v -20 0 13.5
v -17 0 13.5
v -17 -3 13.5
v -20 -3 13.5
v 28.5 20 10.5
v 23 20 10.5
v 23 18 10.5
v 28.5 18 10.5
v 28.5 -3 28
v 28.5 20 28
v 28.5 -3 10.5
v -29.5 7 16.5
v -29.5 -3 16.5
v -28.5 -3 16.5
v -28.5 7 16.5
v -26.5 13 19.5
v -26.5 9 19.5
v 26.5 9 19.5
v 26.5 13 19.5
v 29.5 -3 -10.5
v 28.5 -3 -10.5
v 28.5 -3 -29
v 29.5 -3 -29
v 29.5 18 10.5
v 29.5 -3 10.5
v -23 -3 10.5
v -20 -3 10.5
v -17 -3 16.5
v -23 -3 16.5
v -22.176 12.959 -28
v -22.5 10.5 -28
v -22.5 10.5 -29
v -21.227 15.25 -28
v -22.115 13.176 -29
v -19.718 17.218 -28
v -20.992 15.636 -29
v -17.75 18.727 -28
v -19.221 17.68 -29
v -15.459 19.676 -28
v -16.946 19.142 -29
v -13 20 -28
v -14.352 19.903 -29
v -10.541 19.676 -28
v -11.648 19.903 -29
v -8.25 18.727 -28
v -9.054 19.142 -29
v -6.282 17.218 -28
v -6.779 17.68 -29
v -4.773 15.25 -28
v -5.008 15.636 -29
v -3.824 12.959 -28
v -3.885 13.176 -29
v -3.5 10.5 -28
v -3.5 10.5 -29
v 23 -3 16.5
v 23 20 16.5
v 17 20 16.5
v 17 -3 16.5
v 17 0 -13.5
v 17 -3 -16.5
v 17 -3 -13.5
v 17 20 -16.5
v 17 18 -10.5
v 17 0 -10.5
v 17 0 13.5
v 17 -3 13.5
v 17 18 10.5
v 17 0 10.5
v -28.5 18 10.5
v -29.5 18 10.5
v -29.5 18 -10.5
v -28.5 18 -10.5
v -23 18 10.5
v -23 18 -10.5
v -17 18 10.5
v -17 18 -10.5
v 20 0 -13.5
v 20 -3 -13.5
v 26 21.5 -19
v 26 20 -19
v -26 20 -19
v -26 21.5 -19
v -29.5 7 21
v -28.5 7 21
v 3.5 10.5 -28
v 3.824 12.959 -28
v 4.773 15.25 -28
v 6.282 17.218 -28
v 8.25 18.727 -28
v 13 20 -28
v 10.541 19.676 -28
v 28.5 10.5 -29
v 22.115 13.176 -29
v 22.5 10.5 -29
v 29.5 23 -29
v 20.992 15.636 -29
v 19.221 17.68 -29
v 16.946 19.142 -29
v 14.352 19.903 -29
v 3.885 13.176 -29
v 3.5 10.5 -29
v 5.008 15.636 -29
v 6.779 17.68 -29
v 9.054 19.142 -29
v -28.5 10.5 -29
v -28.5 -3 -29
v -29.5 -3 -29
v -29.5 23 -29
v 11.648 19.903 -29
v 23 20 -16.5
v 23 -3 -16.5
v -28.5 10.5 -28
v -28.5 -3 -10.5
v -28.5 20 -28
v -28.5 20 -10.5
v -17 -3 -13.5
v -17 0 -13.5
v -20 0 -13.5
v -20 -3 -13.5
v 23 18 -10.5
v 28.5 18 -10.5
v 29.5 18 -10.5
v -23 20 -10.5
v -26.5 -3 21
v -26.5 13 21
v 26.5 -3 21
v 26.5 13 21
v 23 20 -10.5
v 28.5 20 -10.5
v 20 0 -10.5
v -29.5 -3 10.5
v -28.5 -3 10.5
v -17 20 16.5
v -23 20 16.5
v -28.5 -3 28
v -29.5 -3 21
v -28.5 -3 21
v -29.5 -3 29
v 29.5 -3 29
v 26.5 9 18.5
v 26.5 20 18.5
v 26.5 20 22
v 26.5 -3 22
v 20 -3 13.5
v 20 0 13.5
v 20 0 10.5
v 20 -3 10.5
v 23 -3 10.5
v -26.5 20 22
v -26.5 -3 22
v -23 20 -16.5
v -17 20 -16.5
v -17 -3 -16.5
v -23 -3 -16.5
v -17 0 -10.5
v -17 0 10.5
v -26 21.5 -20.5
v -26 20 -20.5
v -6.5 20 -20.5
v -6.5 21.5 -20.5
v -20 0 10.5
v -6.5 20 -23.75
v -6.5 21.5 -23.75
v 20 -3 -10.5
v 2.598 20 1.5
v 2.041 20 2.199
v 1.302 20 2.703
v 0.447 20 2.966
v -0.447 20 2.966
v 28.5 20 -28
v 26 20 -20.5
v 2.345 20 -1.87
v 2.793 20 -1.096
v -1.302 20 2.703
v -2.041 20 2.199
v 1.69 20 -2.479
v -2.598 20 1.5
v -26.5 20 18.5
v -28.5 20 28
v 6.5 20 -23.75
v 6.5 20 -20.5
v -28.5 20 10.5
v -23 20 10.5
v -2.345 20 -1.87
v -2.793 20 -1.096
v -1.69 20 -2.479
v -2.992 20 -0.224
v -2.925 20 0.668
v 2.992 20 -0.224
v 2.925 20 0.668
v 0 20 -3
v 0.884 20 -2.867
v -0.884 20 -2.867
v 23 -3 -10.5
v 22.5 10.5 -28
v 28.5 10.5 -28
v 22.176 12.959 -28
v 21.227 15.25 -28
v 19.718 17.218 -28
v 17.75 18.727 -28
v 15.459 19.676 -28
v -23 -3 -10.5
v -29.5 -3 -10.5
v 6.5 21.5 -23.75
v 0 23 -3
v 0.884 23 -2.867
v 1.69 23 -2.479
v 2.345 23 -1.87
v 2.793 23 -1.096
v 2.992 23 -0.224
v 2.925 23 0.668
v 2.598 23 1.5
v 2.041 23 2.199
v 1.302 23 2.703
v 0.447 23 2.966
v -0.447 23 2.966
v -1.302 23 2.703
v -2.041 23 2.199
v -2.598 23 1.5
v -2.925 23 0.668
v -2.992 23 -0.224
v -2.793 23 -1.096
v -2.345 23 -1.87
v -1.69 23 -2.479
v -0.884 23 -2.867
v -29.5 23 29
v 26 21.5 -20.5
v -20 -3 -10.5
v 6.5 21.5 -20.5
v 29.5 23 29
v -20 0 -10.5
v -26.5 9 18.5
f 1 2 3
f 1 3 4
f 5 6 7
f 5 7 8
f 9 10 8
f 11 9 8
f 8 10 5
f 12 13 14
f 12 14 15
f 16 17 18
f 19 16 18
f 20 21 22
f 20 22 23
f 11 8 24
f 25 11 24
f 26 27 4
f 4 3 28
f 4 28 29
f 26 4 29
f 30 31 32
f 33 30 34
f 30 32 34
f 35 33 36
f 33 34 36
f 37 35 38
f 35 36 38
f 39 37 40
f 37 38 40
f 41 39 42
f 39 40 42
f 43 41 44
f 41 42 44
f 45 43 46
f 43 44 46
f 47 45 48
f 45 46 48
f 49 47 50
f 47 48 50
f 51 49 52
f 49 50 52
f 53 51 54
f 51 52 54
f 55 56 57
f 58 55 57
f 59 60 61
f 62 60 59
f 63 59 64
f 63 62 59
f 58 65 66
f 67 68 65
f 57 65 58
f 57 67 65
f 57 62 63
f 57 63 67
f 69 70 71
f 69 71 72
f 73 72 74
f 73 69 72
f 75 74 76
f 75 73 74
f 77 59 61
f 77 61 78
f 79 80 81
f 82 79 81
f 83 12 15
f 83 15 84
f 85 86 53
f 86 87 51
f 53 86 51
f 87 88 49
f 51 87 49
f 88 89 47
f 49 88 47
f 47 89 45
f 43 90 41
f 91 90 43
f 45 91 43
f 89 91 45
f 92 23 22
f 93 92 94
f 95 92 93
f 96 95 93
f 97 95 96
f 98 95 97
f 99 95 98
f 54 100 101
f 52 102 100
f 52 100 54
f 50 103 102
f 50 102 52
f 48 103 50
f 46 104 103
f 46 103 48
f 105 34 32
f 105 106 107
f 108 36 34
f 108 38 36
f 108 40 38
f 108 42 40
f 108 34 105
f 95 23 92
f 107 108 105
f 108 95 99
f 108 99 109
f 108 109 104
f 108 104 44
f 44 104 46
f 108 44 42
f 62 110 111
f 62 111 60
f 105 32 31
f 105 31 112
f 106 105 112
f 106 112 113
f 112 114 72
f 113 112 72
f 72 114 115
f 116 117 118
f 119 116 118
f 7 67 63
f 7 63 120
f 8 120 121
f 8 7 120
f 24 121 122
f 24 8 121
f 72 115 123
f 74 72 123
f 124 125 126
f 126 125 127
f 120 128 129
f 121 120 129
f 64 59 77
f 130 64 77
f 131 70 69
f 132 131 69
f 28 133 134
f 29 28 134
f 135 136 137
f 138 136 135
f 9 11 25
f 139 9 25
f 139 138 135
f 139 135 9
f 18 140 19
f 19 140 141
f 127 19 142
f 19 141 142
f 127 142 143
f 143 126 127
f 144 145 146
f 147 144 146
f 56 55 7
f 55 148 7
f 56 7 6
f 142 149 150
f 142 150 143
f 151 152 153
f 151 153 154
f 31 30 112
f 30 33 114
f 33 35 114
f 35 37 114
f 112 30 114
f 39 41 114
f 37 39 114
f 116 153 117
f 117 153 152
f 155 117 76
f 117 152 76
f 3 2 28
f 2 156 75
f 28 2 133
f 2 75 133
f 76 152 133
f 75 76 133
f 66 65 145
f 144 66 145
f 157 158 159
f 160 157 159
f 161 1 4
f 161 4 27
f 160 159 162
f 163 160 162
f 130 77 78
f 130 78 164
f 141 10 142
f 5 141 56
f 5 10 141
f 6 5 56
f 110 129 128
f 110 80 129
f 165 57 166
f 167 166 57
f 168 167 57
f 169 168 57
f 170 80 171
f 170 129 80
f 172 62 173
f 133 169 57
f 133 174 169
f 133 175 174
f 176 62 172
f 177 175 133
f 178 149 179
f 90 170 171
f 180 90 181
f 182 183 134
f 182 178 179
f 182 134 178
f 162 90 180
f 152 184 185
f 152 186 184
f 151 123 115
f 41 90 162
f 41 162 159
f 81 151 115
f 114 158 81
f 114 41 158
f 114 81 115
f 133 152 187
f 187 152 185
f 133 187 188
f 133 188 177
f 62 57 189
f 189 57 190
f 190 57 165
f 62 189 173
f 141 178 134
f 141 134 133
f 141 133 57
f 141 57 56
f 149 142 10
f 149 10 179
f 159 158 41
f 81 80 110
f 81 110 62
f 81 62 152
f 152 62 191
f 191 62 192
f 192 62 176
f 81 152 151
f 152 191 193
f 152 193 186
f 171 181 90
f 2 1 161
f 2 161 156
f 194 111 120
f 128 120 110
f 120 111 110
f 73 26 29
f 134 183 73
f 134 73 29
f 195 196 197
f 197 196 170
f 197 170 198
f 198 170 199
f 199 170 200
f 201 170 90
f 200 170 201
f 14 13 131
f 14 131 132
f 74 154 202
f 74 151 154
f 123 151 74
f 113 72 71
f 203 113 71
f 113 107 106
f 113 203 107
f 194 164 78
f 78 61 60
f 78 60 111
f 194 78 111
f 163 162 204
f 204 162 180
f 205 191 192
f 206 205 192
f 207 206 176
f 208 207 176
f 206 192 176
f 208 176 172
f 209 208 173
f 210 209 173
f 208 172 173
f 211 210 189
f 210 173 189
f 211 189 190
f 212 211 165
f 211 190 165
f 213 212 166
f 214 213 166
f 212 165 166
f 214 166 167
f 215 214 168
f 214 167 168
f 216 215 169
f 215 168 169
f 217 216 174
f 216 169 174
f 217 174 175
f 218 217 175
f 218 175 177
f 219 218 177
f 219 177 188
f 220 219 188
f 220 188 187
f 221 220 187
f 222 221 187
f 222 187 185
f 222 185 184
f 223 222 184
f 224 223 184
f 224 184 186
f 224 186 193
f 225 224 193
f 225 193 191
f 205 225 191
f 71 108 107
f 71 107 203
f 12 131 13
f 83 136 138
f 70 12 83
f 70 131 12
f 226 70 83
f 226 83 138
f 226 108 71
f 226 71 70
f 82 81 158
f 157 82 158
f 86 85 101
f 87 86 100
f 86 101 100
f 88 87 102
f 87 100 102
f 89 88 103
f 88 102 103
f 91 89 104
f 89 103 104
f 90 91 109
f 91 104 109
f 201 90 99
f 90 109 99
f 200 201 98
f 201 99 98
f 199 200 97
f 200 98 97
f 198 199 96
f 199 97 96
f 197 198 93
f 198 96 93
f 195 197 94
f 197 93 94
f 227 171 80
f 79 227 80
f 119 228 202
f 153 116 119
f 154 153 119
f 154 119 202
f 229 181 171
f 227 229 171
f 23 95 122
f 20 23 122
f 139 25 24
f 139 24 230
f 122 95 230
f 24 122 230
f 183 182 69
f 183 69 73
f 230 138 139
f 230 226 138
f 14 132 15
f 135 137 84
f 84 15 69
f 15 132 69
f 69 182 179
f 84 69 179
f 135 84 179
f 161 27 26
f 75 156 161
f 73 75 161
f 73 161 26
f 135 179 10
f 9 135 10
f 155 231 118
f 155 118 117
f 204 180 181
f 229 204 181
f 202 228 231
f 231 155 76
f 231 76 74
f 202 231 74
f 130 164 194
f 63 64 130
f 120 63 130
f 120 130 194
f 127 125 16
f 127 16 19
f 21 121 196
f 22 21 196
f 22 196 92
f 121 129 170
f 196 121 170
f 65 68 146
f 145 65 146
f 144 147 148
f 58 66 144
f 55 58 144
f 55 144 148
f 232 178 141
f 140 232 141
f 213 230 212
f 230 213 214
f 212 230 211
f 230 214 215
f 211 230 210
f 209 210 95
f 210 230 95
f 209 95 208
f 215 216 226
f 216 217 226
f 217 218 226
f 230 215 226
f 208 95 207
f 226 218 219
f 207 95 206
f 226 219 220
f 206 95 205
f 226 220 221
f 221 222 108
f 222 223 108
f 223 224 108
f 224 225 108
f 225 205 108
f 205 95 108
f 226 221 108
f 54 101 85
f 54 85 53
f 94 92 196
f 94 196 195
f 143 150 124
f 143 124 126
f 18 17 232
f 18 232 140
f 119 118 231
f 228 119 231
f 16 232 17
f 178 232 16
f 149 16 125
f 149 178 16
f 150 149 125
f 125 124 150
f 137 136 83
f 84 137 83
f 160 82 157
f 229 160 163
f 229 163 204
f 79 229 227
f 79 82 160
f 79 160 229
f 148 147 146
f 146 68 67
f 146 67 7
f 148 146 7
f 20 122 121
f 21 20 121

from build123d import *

# Parameters (mm, degrees)
SKETCH1_W            = 46
SKETCH1_H            = 33
BOSS_EXTRUDE1_DEPTH  = 23
CUT_EXTRUDE2_DEPTH   = 20
BOSS_EXTRUDE2_DEPTH  = 3
MIRROR2_COPY_1_DEPTH = 3
SKETCH6_W            = 6
SKETCH6_H            = 21
CUT_EXTRUDE3_DEPTH   = 20
SKETCH7_R            = 3
CUT_EXTRUDE5_DEPTH   = 37.47259245
SKETCH8_W            = 46
SKETCH8_H            = 3
BOSS_EXTRUDE3_DEPTH  = 6.5
SKETCH10_W           = 6
SKETCH10_H           = 21
BOSS_EXTRUDE4_DEPTH  = 20
CUT_EXTRUDE7_REACH   = 58.338
SKETCH11_W           = 21
SKETCH11_H           = 20
SKETCH13_W           = 46
SKETCH13_H           = 3
BOSS_EXTRUDE6_DEPTH  = 6.5
CUT_EXTRUDE8_DEPTH   = 1.5
SKETCH14_W           = 59
SKETCH14_H           = 3
BOSS_EXTRUDE7_DEPTH  = 6
SKETCH15_W           = 13
SKETCH15_H           = 0.75
CUT_EXTRUDE9_DEPTH   = 1.5
BOSS_EXTRUDE8_DEPTH  = 23
CUT_EXTRUDE11_REACH  = 71.016
SKETCH17_R           = 9.5
SKETCH17_W           = 57
SKETCH17_H           = 13.5
SKETCH20_W           = 53
SKETCH20_H           = 3.5
BOSS_EXTRUDE10_DEPTH = 11
SKETCH22_W           = 53
SKETCH22_H           = 1.5
CUT_EXTRUDE12_DEPTH  = 4
SKETCH23_W           = 12
SKETCH23_H           = 33
CUT_EXTRUDE13_DEPTH  = 20
SKETCH25_W           = 6.5
SKETCH25_H           = 21
BOSS_EXTRUDE11_DEPTH = 2
SKETCH27_W           = 53
SKETCH27_H           = 1
BOSS_EXTRUDE12_DEPTH = 12
SKETCH18_W           = 53
SKETCH18_H           = 1
BOSS_EXTRUDE13_DEPTH = 23
SKETCH33_W           = 12.5
SKETCH33_H           = 21
BOSS_EXTRUDE14_DEPTH = 2
CUT_EXTRUDE14_REACH  = 71.649
SKETCH34_W           = 4.5
SKETCH34_H           = 10


with BuildPart() as part:
    # Sketch1 → Boss-Extrude1 (new body)
    with BuildSketch(Plane(origin=(0, 0, 0), x_dir=(1, 0, 0), z_dir=(0, 1, 0))):
        Rectangle(SKETCH1_W, SKETCH1_H)
    extrude(amount=BOSS_EXTRUDE1_DEPTH)

    # Sketch3 → Cut-Extrude2 (cut)
    with BuildSketch(Plane.XZ):
        Polygon((-17, -10.5), (-17, -16.5), (5, -16.5), (5, -10.5), (17, -10.5), (17, 10.5), (5, 10.5), (5, 16.5), (-17, 16.5), (-17, 10.5), (-23, 10.5), (-23, -10.5), align=None)
    extrude(amount=-CUT_EXTRUDE2_DEPTH, mode=Mode.SUBTRACT)

    # Sketch5 → Boss-Extrude2 (add)
    with BuildSketch(Plane.XZ):
        Polygon((-17, 13.5), (-20, 13.5), (-20, 10.5), (-23, 10.5), (-23, 16.5), (-17, 16.5), align=None)
    boss_extrude2 = extrude(amount=BOSS_EXTRUDE2_DEPTH)

    # Mirror1: Boss-Extrude2 across plane
    add(boss_extrude2.mirror(Plane.XY))

    # Mirror2: Boss-Extrude2 across plane
    add(boss_extrude2.mirror(Plane(origin=(0, 0, 0), x_dir=(0, 0, 1), z_dir=(1, 0, 0))))

    # Mirror2 copy 1 sketch → Mirror2 copy 1 (add)
    with BuildSketch(Plane(origin=(0, 0, 0), x_dir=(-1, 0, 0), z_dir=(0, -1, 0))):
        Polygon((-17, 13.5), (-20, 13.5), (-20, 10.5), (-23, 10.5), (-23, 16.5), (-17, 16.5), align=None)
    extrude(amount=MIRROR2_COPY_1_DEPTH)

    # Sketch6 → Cut-Extrude3 (cut)
    with BuildSketch(Plane.XZ):
        with Locations((20, 0)):
            Rectangle(SKETCH6_W, SKETCH6_H)
    extrude(amount=-CUT_EXTRUDE3_DEPTH, mode=Mode.SUBTRACT)

    # Sketch7 → Cut-Extrude5 (cut, through all)
    with BuildSketch(Plane.XZ.offset(-20)):
        with Locations(Location((0, 0, 0), (0, 0, 270))):
            Circle(SKETCH7_R)
    extrude(amount=-CUT_EXTRUDE5_DEPTH, mode=Mode.SUBTRACT)

    # Sketch8 → Boss-Extrude3 (add)
    with BuildSketch(Plane(origin=(0, 0, -16.5), x_dir=(-1, 0, 0), z_dir=(0, 0, -1))):
        with Locations((0, 21.5)):
            Rectangle(SKETCH8_W, SKETCH8_H)
    boss_extrude3 = extrude(amount=BOSS_EXTRUDE3_DEPTH)

    # Mirror3: Boss-Extrude3 across plane
    add(boss_extrude3.mirror(Plane.XY))

    # Sketch10 → Boss-Extrude4 (add)
    with BuildSketch(Plane.XZ.offset(-20)):
        with Locations((-20, 0)):
            Rectangle(SKETCH10_W, SKETCH10_H)
    extrude(amount=BOSS_EXTRUDE4_DEPTH)

    # Sketch11 → Cut-Extrude7 (cut, up to next)
    with BuildSketch(Plane.ZY.offset(23), mode=Mode.PRIVATE) as cut_extrude7_sk1:
        with Locations((0, 8)):
            Rectangle(SKETCH11_W, SKETCH11_H)
    cut_extrude7_tool1 = extrude(cut_extrude7_sk1.sketch, amount=-CUT_EXTRUDE7_REACH, mode=Mode.PRIVATE) & part.part
    add(cut_extrude7_tool1.solids().sort_by_distance((-23, 8, 0))[0], mode=Mode.SUBTRACT)

    # Sketch13 → Boss-Extrude6 (add)
    with BuildSketch(Plane(origin=(23, 0, 0), x_dir=(0, 0, -1), z_dir=(1, 0, 0))):
        with Locations((0, 21.5)):
            Rectangle(SKETCH13_W, SKETCH13_H)
    boss_extrude6 = extrude(amount=BOSS_EXTRUDE6_DEPTH)

    # Mirror4: Boss-Extrude6 across plane
    add(boss_extrude6.mirror(Plane(origin=(0, 0, 0), x_dir=(0, 0, 1), z_dir=(1, 0, 0))))

    # Sketch12 → Cut-Extrude8 (cut)
    with BuildSketch(Plane.XZ.offset(-20)):
        Polygon((-6.5, -20.5), (-6.5, -23), (6.5, -23), (6.5, -20.5), (26, -20.5), (26, -19), (-26, -19), (-26, -20.5), align=None)
    extrude(amount=-CUT_EXTRUDE8_DEPTH, mode=Mode.SUBTRACT)

    # Sketch14 → Boss-Extrude7 (add)
    with BuildSketch(Plane(origin=(0, 0, -23), x_dir=(-1, 0, 0), z_dir=(0, 0, -1))):
        with Locations((0, 21.5)):
            Rectangle(SKETCH14_W, SKETCH14_H)
    boss_extrude7 = extrude(amount=BOSS_EXTRUDE7_DEPTH)

    # Mirror5: Boss-Extrude7 across plane
    add(boss_extrude7.mirror(Plane.XY))

    # Sketch15 → Cut-Extrude9 (cut)
    with BuildSketch(Plane.XZ.offset(-20)):
        with Locations((0, -23.375)):
            Rectangle(SKETCH15_W, SKETCH15_H)
    extrude(amount=-CUT_EXTRUDE9_DEPTH, mode=Mode.SUBTRACT)

    # Sketch16 → Boss-Extrude8 (add)
    with BuildSketch(Plane.XZ.offset(-20)):
        Polygon((-28.5, 28), (-26.5, 28), (-26.5, 29), (-29.5, 29), (-29.5, 10.5), (-28.5, 10.5), align=None)
        Polygon((26.5, 28), (28.5, 28), (28.5, 10.5), (29.5, 10.5), (29.5, 29), (26.5, 29), align=None)
        Polygon((29.5, -10.5), (28.5, -10.5), (28.5, -28), (-28.5, -28), (-28.5, -10.5), (-29.5, -10.5), (-29.5, -29), (29.5, -29), align=None)
    extrude(amount=BOSS_EXTRUDE8_DEPTH)

    # Sketch17 → Cut-Extrude11 (cut, up to next)
    with BuildSketch(Plane(origin=(0, 0, -29), x_dir=(-1, 0, 0), z_dir=(0, 0, -1)), mode=Mode.PRIVATE) as cut_extrude11_sk1:
        with Locations((13, 10.5)):
            Circle(SKETCH17_R)
    cut_extrude11_tool1 = extrude(cut_extrude11_sk1.sketch, amount=-CUT_EXTRUDE11_REACH, mode=Mode.PRIVATE) & part.part
    # Sketch17 → Cut-Extrude11 (cut, up to next)
    with BuildSketch(Plane(origin=(0, 0, -29), x_dir=(-1, 0, 0), z_dir=(0, 0, -1)), mode=Mode.PRIVATE) as cut_extrude11_sk2:
        with Locations((-13, 10.5)):
            Circle(SKETCH17_R)
    cut_extrude11_tool2 = extrude(cut_extrude11_sk2.sketch, amount=-CUT_EXTRUDE11_REACH, mode=Mode.PRIVATE) & part.part
    # Sketch17 → Cut-Extrude11 (cut, up to next)
    with BuildSketch(Plane(origin=(0, 0, -29), x_dir=(-1, 0, 0), z_dir=(0, 0, -1)), mode=Mode.PRIVATE) as cut_extrude11_sk3:
        with Locations((0, 3.75)):
            Rectangle(SKETCH17_W, SKETCH17_H)
    cut_extrude11_tool3 = extrude(cut_extrude11_sk3.sketch, amount=-CUT_EXTRUDE11_REACH, mode=Mode.PRIVATE) & part.part
    add(cut_extrude11_tool1.solids().sort_by_distance((-13, 10.5, -29))[0], mode=Mode.SUBTRACT)
    add(cut_extrude11_tool2.solids().sort_by_distance((13, 10.5, -29))[0], mode=Mode.SUBTRACT)
    add(cut_extrude11_tool3.solids().sort_by_distance((0, 3.75, -29))[0], mode=Mode.SUBTRACT)

    # Sketch20 → Boss-Extrude10 (add)
    with BuildSketch(Plane.XZ.offset(-20)):
        with Locations((0, 20.25)):
            Rectangle(SKETCH20_W, SKETCH20_H)
    extrude(amount=BOSS_EXTRUDE10_DEPTH)

    # Sketch22 → Cut-Extrude12 (cut)
    with BuildSketch(Plane.XZ.offset(-9)):
        with Locations((0, 20.25)):
            Rectangle(SKETCH22_W, SKETCH22_H)
    extrude(amount=-CUT_EXTRUDE12_DEPTH, mode=Mode.SUBTRACT)

    # Sketch23 → Cut-Extrude13 (cut)
    with BuildSketch(Plane.XZ):
        with Locations((11, 0)):
            Rectangle(SKETCH23_W, SKETCH23_H)
    extrude(amount=-CUT_EXTRUDE13_DEPTH, mode=Mode.SUBTRACT)

    # Sketch25 → Boss-Extrude11 (add)
    with BuildSketch(Plane.XZ.offset(-20)):
        with Locations((-26.25, 0)):
            Rectangle(SKETCH25_W, SKETCH25_H)
    extrude(amount=BOSS_EXTRUDE11_DEPTH)

    # Sketch27 → Boss-Extrude12 (add)
    with BuildSketch(Plane.XZ.offset(-9)):
        with Locations((0, 21.5)):
            Rectangle(SKETCH27_W, SKETCH27_H)
    extrude(amount=BOSS_EXTRUDE12_DEPTH)

    # Sketch18 → Boss-Extrude13 (add)
    with BuildSketch(Plane.XZ.offset(-20)):
        with Locations((0, 28.5)):
            Rectangle(SKETCH18_W, SKETCH18_H)
    extrude(amount=BOSS_EXTRUDE13_DEPTH)

    # Sketch33 → Boss-Extrude14 (add)
    with BuildSketch(Plane.XZ.offset(-20)):
        with Locations((23.25, 0)):
            Rectangle(SKETCH33_W, SKETCH33_H)
    extrude(amount=BOSS_EXTRUDE14_DEPTH)

    # Sketch34 → Cut-Extrude14 (cut, up to next)
    with BuildSketch(Plane.ZY.offset(29.5), mode=Mode.PRIVATE) as cut_extrude14_sk1:
        with Locations((18.75, 2)):
            Rectangle(SKETCH34_W, SKETCH34_H)
    cut_extrude14_tool1 = extrude(cut_extrude14_sk1.sketch, amount=-CUT_EXTRUDE14_REACH, mode=Mode.PRIVATE) & part.part
    add(cut_extrude14_tool1.solids().sort_by_distance((-29.5, 2, 18.75))[0], mode=Mode.SUBTRACT)


solid = part.part
